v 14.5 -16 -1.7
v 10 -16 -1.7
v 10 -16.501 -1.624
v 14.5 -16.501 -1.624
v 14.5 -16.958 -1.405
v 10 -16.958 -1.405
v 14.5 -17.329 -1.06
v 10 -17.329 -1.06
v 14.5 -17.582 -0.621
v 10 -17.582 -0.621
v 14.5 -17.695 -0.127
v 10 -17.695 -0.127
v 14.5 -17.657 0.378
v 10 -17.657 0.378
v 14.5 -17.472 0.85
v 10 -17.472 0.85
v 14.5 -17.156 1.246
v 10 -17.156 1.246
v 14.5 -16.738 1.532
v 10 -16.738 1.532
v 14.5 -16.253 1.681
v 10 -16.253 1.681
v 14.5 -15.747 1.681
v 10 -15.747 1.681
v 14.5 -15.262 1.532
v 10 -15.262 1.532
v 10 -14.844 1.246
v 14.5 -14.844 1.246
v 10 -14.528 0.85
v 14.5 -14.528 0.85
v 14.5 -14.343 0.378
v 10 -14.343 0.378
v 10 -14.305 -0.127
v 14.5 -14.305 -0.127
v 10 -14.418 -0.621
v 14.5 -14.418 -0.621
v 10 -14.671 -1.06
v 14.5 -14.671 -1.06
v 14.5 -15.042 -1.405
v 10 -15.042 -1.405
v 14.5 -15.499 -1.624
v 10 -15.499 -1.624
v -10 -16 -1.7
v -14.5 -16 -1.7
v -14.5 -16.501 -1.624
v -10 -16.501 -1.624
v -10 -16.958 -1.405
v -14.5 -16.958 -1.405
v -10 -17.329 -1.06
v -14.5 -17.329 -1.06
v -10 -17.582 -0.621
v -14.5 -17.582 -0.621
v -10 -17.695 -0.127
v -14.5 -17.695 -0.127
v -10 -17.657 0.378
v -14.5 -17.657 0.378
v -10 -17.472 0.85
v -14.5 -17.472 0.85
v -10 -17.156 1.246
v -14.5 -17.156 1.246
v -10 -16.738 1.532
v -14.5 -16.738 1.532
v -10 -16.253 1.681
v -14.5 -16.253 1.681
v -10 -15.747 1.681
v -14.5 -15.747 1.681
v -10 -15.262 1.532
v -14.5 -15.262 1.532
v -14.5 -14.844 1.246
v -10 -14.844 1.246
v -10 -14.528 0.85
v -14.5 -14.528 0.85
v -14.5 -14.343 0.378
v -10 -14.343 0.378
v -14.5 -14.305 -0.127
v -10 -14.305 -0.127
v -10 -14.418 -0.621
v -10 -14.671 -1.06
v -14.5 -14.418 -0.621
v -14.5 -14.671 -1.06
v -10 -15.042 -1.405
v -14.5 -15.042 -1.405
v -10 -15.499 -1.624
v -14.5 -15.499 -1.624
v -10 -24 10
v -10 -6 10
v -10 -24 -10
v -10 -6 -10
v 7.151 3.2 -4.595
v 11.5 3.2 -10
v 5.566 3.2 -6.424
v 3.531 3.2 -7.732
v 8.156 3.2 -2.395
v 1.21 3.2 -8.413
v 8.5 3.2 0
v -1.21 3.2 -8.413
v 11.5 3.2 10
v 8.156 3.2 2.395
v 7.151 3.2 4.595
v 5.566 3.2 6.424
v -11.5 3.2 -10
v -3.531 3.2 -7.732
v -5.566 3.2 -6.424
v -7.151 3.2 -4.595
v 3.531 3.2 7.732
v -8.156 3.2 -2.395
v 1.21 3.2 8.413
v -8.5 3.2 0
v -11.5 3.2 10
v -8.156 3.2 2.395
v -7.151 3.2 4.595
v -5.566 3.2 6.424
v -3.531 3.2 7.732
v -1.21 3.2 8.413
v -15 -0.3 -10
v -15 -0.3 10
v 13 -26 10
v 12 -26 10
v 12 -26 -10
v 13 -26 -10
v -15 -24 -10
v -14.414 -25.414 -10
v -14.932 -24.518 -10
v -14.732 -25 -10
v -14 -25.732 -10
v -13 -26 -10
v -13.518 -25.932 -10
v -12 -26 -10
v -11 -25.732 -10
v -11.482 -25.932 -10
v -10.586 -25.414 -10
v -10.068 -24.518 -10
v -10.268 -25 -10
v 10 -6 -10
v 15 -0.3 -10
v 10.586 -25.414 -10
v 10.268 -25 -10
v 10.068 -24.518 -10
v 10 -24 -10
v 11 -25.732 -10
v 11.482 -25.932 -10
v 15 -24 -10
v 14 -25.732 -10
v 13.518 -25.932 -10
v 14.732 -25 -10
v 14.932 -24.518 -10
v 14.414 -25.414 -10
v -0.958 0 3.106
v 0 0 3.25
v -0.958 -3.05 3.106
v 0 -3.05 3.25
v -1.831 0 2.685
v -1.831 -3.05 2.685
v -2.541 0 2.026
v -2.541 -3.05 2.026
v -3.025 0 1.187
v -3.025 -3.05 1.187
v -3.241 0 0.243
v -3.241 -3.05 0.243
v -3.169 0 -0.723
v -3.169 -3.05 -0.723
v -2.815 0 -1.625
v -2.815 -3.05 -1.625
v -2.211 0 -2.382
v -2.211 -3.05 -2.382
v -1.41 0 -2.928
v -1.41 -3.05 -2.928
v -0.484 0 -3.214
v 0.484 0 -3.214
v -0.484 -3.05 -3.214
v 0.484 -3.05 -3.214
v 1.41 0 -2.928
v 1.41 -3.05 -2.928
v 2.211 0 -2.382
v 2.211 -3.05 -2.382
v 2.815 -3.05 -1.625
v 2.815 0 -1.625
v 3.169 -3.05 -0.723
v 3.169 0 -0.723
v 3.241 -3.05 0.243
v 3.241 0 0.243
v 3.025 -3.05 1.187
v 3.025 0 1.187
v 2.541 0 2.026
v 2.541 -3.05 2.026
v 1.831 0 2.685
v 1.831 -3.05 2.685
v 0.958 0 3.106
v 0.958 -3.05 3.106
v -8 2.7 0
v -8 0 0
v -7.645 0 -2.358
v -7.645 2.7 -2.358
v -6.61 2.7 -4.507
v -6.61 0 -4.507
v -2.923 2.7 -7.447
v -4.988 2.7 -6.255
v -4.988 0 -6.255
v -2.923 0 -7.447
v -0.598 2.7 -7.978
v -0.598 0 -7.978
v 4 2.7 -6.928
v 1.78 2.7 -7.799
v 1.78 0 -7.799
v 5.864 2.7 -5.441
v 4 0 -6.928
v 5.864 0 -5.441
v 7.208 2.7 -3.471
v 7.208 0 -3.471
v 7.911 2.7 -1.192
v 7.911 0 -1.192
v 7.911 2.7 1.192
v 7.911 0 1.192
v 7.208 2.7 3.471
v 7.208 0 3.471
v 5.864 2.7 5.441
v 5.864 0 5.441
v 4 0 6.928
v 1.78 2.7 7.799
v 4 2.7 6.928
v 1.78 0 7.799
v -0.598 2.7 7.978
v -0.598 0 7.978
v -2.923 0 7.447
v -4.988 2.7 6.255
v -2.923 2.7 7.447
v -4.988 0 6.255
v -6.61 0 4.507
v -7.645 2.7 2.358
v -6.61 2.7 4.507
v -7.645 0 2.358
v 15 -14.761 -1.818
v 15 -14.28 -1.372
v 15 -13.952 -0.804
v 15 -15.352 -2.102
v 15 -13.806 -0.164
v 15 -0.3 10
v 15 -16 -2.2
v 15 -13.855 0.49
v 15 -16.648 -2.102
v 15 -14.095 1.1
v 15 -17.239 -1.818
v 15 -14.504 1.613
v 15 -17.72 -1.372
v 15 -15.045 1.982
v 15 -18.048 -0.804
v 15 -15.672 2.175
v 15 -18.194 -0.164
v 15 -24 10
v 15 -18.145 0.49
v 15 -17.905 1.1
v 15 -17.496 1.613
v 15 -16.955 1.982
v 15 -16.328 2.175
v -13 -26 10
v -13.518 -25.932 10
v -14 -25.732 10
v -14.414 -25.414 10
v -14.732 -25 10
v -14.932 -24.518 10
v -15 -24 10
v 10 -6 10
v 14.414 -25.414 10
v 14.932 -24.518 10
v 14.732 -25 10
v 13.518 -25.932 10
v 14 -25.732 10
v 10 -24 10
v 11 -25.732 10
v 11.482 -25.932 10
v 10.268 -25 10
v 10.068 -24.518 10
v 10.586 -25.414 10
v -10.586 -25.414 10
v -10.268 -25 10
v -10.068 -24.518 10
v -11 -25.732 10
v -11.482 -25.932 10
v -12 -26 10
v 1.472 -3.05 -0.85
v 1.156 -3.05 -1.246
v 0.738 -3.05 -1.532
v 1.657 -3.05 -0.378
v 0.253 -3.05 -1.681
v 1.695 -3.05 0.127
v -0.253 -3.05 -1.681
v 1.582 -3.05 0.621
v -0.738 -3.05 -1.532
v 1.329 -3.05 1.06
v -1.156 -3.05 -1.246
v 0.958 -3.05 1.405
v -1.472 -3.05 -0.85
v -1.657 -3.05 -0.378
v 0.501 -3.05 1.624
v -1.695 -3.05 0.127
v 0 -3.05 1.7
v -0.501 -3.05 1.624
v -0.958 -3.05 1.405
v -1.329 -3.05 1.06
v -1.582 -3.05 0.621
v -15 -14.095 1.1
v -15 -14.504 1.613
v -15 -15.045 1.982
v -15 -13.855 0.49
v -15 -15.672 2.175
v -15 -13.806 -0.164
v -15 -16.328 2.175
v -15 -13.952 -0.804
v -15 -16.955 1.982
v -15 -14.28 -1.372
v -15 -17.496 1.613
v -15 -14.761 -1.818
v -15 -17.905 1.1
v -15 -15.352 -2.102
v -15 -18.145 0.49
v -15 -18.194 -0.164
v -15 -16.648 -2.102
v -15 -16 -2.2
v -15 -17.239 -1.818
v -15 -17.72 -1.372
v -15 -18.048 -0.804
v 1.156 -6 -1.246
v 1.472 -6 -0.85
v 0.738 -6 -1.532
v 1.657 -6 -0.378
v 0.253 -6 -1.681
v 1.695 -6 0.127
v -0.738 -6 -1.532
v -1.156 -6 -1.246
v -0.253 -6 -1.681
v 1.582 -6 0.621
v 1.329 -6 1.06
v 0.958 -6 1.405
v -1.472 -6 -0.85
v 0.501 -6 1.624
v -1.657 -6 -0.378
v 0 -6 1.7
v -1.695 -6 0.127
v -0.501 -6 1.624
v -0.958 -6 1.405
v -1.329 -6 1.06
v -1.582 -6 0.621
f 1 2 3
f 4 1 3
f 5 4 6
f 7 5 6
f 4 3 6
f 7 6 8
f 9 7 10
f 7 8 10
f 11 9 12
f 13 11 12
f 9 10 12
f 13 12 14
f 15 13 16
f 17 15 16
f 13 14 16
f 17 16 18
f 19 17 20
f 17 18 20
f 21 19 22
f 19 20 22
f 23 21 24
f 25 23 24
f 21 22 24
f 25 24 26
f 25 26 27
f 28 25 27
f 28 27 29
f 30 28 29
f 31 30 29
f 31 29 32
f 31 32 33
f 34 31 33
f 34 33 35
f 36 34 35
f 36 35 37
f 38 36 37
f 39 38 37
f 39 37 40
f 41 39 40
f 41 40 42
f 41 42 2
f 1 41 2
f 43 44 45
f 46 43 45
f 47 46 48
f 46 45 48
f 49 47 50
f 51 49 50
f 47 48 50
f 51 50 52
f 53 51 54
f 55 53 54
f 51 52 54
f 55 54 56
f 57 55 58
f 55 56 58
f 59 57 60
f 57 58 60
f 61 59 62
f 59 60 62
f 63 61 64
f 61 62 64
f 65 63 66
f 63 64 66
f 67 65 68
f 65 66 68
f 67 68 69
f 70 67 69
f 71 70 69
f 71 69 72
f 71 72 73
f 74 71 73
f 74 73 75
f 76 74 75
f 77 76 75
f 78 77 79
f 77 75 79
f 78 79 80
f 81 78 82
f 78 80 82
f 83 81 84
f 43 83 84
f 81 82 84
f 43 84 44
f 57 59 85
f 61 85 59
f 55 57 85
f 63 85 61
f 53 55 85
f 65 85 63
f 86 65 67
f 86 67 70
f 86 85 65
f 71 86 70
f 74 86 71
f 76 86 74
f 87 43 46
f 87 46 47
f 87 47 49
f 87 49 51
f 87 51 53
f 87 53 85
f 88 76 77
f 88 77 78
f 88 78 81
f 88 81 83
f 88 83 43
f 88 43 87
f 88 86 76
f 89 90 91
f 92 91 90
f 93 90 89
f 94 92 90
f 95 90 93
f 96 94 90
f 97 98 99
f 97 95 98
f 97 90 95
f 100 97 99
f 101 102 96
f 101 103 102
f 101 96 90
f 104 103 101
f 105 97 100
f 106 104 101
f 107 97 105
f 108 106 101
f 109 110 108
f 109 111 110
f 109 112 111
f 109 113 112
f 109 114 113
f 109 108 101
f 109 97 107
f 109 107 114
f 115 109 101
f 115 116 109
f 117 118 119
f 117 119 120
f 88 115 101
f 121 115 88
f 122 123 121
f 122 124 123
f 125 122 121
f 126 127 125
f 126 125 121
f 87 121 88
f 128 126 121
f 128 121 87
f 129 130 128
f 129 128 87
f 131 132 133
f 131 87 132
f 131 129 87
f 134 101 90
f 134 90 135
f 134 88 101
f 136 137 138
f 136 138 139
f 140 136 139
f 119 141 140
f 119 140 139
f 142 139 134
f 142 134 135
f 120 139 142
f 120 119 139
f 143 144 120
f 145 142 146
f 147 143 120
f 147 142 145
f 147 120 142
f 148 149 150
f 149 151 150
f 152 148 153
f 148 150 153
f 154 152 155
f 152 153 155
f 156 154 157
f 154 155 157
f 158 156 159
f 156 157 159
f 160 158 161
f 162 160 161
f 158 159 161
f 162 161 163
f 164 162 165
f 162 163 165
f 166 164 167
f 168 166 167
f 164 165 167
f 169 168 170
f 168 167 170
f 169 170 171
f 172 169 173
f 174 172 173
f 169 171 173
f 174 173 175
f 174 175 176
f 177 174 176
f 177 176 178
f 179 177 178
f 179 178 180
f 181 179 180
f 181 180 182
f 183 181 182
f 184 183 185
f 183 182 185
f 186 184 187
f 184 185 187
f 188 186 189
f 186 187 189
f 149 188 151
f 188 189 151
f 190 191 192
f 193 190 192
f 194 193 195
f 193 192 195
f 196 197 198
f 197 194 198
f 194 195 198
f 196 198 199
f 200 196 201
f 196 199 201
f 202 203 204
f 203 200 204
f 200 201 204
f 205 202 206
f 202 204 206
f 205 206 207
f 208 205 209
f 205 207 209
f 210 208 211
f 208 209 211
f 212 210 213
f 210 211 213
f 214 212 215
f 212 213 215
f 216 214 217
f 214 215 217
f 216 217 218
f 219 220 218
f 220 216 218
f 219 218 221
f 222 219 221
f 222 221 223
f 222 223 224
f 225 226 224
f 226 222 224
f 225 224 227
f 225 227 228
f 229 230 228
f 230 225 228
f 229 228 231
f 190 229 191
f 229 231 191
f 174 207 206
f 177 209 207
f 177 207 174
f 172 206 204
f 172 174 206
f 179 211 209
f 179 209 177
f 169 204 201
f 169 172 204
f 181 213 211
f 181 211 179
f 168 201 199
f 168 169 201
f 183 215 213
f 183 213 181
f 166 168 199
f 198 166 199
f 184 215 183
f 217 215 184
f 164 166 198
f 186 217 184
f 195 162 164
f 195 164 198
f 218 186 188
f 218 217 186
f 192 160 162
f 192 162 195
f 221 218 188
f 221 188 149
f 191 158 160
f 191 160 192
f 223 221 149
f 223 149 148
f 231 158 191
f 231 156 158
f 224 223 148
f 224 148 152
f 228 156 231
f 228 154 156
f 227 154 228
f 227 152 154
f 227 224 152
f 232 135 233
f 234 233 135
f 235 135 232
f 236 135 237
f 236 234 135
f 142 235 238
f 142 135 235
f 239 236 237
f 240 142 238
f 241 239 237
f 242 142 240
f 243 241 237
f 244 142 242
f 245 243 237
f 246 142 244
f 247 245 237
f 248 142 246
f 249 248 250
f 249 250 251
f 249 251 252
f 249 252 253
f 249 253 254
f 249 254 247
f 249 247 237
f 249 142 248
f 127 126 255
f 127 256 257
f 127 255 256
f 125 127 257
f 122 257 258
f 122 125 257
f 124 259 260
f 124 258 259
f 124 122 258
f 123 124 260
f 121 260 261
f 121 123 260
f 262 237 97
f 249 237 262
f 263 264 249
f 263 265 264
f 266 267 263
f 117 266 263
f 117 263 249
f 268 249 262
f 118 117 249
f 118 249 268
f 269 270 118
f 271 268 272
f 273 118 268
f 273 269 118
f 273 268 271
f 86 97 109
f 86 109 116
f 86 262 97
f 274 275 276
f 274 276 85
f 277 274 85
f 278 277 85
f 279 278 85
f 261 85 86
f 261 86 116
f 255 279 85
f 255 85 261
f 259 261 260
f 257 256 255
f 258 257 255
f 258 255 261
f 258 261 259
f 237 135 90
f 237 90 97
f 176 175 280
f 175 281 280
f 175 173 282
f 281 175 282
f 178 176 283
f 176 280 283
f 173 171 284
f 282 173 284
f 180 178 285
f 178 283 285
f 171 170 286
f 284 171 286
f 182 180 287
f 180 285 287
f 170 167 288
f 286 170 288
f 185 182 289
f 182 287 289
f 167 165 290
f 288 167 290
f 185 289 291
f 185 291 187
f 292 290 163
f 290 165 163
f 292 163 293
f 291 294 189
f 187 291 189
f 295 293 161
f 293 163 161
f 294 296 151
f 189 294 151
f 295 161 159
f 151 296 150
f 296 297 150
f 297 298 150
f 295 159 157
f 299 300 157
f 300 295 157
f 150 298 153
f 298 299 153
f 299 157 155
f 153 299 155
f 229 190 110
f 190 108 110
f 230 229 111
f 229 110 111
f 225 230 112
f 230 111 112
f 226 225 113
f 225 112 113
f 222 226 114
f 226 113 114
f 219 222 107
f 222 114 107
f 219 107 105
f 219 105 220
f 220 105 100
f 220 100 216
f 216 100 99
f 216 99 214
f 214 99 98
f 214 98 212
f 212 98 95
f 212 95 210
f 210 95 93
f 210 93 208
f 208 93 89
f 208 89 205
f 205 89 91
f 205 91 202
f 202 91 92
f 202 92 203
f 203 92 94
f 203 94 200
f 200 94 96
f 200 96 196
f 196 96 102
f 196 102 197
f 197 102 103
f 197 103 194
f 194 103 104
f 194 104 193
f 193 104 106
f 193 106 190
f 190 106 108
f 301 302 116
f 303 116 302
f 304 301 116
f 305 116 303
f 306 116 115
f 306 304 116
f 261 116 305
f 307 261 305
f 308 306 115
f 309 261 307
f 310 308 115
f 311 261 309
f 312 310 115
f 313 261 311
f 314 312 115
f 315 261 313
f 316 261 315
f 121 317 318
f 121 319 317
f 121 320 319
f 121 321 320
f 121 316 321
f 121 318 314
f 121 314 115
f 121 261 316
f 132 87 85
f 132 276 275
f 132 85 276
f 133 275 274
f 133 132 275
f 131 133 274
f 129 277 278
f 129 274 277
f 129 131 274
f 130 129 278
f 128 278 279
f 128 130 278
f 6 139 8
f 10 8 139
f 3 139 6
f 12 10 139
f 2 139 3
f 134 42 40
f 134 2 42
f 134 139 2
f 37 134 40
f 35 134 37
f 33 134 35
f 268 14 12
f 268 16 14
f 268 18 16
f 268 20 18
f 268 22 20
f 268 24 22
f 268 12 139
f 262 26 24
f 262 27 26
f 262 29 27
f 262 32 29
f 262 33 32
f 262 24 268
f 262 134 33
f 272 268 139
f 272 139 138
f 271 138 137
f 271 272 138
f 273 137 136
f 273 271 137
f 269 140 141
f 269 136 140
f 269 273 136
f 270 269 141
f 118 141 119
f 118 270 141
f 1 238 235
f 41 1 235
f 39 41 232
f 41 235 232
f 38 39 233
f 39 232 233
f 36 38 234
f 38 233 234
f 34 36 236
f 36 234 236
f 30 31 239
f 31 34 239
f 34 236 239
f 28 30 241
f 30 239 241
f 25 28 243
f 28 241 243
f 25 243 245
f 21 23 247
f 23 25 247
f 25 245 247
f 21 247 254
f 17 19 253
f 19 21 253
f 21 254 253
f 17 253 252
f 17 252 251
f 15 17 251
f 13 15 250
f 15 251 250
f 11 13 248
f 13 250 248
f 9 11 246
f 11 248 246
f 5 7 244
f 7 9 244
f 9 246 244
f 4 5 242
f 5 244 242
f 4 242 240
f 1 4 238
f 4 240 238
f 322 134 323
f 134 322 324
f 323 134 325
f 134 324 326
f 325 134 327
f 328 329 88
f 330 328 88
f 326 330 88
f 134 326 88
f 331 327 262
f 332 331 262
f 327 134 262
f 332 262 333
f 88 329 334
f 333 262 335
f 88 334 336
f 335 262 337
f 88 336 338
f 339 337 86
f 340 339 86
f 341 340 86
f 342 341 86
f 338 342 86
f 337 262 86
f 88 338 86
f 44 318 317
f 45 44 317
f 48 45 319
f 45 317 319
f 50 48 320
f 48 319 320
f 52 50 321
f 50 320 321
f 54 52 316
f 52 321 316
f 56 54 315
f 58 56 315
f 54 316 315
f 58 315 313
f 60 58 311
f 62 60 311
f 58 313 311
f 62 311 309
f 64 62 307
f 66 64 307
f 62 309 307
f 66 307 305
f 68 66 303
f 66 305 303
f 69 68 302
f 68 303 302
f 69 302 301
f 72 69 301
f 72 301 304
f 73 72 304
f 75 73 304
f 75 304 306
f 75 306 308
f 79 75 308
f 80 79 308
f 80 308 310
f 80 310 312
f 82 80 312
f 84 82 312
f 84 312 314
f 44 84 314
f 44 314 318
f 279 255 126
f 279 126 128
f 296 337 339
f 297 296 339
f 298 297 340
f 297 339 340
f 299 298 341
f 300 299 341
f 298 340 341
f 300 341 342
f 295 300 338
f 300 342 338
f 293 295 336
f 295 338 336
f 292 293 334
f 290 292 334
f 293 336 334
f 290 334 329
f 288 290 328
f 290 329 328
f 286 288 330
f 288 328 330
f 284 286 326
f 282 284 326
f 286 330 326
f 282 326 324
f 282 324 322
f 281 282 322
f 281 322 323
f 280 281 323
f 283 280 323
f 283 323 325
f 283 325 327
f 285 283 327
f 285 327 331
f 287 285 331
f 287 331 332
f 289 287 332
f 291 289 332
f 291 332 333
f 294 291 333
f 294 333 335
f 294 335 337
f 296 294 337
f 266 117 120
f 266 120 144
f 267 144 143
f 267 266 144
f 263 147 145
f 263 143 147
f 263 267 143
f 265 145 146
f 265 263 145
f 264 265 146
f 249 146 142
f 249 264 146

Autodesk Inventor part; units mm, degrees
ref_plane "YZ Plane" through (0, 0, 0) normal (1, 0, 0) x (0, 1, 0)
ref_plane "XZ Plane" through (0, 0, 0) normal (0, 1, 0) x (-1, 0, 0)
ref_plane "XY Plane" through (0, 0, 0) normal (0, 0, 1) x (1, 0, 0)
sketch "Sketch1" plane through (0, 0, 0) normal (0, 1, 0) x (-1, 0, 0)
  circle A0 centre (0, 0) radius 8
  line L0 (15, -10) -> (-15, -10)
  line L1 (-15, -10) -> (-15, 10)
  line L2 (-15, 10) -> (15, 10)
  line L3 (15, 10) -> (15, -10)
  point P0 (-15, 0)
  point P1 (0, -10)
  dimension "d0" = 30
  dimension "d1" = 16
  dimension "d2" = 20
extrude "Extrusion1" add sketch "Sketch1" against normal blind 6 contours A0 | L0 L1 L2 L3
extrude "Extrusion2" add sketch "Sketch1" along normal blind 3.2
hole "Hole1" at (0, 0, 0) direction (0, -1, 0) diameter 3.4 depth 10 counterbore diameter 6.5 counterbore depth 3.05 clearance for "Socket Head Cap Screw" size "M3" standard "Ansi Metric M Profile"
sketch "Sketch2" plane through (0, -6, 0) normal (0, -1, 0) x (1, 0, 0)
  circle A0 centre (0, 0) radius 1.7 projected
  line L0 (15, 10) -> (-15, 10) projected
  line L1 (-15, 10) -> (-15, -10) projected
  line L2 (-15, -10) -> (15, -10) projected
  line L3 (15, -10) -> (15, 10) projected
  line L4 (-15, 10) -> (-15, -10) projected
  line L5 (-15, 10) -> (-10, 10)
  line L6 (-10, 10) -> (-10, -10)
  line L7 (-10, -10) -> (-15, -10)
  line L8 (-15, -10) -> (-15, 10)
  line L9 (-15, -10) -> (15, -10) projected
  line L10 (15, 10) -> (-15, 10) projected
  line L11 (15, -10) -> (10, -10)
  line L12 (10, -10) -> (10, 10)
  line L13 (10, 10) -> (15, 10)
  line L14 (15, 10) -> (15, -10)
  point P0 (10, 10)
  dimension "d14" = 5
  dimension "d15" = 5
extrude "Extrusion3" add sketch "Sketch2" along normal blind 20 contours L3 L2 L12 L0 | L6 L2 L1 L0
chamfer "Chamfer1" distance 3.5 angle 45 2 edges at (15, 3.2, 0) (-15, 3.2, 0)
fillet "Fillet1" radius 2 4 edges at (-15, -26, 0) (-10, -26, 0) (10, -26, 0) (15, -26, 0)
sketch "Sketch3" plane through (15, -0.3, 10) normal (1, 0, 0) x (0, 0, -1)
  line L0 (20, -23.7) -> (0, -23.7) projected
  line L1 (20, -5.7) -> (20, -23.7) projected
  line L2 (0, -5.7) -> (20, -5.7) projected
  line L3 (0, -5.7) -> (0, -23.7) projected
  line L4 (0, -25.7) -> (20, -25.7) projected
  line L5 (20, -25.7) -> (0, -25.7) projected
  line L6 (0, -5.7) -> (0, -23.7) projected
  line L7 (0, -25.7) -> (0, -5.7)
  point P0 (10, 0.3)
  point P1 (0, -15.7)
  point P2 (10, -25.7)
  point P3 (10, -25.7)
  point P4 (10, -15.7)
hole "Hole2" at (15, -16, 0) direction (-1, 0, 0) diameter 3.4 end through all
chamfer "Chamfer2" distance 0.5 angle 45 3 edges at (8, 3.2, 0) (15, -16, 1.7) (-15, -16, 1.7)
equation "\"d15\" = d14"
properties part number "Magnet Mount"
